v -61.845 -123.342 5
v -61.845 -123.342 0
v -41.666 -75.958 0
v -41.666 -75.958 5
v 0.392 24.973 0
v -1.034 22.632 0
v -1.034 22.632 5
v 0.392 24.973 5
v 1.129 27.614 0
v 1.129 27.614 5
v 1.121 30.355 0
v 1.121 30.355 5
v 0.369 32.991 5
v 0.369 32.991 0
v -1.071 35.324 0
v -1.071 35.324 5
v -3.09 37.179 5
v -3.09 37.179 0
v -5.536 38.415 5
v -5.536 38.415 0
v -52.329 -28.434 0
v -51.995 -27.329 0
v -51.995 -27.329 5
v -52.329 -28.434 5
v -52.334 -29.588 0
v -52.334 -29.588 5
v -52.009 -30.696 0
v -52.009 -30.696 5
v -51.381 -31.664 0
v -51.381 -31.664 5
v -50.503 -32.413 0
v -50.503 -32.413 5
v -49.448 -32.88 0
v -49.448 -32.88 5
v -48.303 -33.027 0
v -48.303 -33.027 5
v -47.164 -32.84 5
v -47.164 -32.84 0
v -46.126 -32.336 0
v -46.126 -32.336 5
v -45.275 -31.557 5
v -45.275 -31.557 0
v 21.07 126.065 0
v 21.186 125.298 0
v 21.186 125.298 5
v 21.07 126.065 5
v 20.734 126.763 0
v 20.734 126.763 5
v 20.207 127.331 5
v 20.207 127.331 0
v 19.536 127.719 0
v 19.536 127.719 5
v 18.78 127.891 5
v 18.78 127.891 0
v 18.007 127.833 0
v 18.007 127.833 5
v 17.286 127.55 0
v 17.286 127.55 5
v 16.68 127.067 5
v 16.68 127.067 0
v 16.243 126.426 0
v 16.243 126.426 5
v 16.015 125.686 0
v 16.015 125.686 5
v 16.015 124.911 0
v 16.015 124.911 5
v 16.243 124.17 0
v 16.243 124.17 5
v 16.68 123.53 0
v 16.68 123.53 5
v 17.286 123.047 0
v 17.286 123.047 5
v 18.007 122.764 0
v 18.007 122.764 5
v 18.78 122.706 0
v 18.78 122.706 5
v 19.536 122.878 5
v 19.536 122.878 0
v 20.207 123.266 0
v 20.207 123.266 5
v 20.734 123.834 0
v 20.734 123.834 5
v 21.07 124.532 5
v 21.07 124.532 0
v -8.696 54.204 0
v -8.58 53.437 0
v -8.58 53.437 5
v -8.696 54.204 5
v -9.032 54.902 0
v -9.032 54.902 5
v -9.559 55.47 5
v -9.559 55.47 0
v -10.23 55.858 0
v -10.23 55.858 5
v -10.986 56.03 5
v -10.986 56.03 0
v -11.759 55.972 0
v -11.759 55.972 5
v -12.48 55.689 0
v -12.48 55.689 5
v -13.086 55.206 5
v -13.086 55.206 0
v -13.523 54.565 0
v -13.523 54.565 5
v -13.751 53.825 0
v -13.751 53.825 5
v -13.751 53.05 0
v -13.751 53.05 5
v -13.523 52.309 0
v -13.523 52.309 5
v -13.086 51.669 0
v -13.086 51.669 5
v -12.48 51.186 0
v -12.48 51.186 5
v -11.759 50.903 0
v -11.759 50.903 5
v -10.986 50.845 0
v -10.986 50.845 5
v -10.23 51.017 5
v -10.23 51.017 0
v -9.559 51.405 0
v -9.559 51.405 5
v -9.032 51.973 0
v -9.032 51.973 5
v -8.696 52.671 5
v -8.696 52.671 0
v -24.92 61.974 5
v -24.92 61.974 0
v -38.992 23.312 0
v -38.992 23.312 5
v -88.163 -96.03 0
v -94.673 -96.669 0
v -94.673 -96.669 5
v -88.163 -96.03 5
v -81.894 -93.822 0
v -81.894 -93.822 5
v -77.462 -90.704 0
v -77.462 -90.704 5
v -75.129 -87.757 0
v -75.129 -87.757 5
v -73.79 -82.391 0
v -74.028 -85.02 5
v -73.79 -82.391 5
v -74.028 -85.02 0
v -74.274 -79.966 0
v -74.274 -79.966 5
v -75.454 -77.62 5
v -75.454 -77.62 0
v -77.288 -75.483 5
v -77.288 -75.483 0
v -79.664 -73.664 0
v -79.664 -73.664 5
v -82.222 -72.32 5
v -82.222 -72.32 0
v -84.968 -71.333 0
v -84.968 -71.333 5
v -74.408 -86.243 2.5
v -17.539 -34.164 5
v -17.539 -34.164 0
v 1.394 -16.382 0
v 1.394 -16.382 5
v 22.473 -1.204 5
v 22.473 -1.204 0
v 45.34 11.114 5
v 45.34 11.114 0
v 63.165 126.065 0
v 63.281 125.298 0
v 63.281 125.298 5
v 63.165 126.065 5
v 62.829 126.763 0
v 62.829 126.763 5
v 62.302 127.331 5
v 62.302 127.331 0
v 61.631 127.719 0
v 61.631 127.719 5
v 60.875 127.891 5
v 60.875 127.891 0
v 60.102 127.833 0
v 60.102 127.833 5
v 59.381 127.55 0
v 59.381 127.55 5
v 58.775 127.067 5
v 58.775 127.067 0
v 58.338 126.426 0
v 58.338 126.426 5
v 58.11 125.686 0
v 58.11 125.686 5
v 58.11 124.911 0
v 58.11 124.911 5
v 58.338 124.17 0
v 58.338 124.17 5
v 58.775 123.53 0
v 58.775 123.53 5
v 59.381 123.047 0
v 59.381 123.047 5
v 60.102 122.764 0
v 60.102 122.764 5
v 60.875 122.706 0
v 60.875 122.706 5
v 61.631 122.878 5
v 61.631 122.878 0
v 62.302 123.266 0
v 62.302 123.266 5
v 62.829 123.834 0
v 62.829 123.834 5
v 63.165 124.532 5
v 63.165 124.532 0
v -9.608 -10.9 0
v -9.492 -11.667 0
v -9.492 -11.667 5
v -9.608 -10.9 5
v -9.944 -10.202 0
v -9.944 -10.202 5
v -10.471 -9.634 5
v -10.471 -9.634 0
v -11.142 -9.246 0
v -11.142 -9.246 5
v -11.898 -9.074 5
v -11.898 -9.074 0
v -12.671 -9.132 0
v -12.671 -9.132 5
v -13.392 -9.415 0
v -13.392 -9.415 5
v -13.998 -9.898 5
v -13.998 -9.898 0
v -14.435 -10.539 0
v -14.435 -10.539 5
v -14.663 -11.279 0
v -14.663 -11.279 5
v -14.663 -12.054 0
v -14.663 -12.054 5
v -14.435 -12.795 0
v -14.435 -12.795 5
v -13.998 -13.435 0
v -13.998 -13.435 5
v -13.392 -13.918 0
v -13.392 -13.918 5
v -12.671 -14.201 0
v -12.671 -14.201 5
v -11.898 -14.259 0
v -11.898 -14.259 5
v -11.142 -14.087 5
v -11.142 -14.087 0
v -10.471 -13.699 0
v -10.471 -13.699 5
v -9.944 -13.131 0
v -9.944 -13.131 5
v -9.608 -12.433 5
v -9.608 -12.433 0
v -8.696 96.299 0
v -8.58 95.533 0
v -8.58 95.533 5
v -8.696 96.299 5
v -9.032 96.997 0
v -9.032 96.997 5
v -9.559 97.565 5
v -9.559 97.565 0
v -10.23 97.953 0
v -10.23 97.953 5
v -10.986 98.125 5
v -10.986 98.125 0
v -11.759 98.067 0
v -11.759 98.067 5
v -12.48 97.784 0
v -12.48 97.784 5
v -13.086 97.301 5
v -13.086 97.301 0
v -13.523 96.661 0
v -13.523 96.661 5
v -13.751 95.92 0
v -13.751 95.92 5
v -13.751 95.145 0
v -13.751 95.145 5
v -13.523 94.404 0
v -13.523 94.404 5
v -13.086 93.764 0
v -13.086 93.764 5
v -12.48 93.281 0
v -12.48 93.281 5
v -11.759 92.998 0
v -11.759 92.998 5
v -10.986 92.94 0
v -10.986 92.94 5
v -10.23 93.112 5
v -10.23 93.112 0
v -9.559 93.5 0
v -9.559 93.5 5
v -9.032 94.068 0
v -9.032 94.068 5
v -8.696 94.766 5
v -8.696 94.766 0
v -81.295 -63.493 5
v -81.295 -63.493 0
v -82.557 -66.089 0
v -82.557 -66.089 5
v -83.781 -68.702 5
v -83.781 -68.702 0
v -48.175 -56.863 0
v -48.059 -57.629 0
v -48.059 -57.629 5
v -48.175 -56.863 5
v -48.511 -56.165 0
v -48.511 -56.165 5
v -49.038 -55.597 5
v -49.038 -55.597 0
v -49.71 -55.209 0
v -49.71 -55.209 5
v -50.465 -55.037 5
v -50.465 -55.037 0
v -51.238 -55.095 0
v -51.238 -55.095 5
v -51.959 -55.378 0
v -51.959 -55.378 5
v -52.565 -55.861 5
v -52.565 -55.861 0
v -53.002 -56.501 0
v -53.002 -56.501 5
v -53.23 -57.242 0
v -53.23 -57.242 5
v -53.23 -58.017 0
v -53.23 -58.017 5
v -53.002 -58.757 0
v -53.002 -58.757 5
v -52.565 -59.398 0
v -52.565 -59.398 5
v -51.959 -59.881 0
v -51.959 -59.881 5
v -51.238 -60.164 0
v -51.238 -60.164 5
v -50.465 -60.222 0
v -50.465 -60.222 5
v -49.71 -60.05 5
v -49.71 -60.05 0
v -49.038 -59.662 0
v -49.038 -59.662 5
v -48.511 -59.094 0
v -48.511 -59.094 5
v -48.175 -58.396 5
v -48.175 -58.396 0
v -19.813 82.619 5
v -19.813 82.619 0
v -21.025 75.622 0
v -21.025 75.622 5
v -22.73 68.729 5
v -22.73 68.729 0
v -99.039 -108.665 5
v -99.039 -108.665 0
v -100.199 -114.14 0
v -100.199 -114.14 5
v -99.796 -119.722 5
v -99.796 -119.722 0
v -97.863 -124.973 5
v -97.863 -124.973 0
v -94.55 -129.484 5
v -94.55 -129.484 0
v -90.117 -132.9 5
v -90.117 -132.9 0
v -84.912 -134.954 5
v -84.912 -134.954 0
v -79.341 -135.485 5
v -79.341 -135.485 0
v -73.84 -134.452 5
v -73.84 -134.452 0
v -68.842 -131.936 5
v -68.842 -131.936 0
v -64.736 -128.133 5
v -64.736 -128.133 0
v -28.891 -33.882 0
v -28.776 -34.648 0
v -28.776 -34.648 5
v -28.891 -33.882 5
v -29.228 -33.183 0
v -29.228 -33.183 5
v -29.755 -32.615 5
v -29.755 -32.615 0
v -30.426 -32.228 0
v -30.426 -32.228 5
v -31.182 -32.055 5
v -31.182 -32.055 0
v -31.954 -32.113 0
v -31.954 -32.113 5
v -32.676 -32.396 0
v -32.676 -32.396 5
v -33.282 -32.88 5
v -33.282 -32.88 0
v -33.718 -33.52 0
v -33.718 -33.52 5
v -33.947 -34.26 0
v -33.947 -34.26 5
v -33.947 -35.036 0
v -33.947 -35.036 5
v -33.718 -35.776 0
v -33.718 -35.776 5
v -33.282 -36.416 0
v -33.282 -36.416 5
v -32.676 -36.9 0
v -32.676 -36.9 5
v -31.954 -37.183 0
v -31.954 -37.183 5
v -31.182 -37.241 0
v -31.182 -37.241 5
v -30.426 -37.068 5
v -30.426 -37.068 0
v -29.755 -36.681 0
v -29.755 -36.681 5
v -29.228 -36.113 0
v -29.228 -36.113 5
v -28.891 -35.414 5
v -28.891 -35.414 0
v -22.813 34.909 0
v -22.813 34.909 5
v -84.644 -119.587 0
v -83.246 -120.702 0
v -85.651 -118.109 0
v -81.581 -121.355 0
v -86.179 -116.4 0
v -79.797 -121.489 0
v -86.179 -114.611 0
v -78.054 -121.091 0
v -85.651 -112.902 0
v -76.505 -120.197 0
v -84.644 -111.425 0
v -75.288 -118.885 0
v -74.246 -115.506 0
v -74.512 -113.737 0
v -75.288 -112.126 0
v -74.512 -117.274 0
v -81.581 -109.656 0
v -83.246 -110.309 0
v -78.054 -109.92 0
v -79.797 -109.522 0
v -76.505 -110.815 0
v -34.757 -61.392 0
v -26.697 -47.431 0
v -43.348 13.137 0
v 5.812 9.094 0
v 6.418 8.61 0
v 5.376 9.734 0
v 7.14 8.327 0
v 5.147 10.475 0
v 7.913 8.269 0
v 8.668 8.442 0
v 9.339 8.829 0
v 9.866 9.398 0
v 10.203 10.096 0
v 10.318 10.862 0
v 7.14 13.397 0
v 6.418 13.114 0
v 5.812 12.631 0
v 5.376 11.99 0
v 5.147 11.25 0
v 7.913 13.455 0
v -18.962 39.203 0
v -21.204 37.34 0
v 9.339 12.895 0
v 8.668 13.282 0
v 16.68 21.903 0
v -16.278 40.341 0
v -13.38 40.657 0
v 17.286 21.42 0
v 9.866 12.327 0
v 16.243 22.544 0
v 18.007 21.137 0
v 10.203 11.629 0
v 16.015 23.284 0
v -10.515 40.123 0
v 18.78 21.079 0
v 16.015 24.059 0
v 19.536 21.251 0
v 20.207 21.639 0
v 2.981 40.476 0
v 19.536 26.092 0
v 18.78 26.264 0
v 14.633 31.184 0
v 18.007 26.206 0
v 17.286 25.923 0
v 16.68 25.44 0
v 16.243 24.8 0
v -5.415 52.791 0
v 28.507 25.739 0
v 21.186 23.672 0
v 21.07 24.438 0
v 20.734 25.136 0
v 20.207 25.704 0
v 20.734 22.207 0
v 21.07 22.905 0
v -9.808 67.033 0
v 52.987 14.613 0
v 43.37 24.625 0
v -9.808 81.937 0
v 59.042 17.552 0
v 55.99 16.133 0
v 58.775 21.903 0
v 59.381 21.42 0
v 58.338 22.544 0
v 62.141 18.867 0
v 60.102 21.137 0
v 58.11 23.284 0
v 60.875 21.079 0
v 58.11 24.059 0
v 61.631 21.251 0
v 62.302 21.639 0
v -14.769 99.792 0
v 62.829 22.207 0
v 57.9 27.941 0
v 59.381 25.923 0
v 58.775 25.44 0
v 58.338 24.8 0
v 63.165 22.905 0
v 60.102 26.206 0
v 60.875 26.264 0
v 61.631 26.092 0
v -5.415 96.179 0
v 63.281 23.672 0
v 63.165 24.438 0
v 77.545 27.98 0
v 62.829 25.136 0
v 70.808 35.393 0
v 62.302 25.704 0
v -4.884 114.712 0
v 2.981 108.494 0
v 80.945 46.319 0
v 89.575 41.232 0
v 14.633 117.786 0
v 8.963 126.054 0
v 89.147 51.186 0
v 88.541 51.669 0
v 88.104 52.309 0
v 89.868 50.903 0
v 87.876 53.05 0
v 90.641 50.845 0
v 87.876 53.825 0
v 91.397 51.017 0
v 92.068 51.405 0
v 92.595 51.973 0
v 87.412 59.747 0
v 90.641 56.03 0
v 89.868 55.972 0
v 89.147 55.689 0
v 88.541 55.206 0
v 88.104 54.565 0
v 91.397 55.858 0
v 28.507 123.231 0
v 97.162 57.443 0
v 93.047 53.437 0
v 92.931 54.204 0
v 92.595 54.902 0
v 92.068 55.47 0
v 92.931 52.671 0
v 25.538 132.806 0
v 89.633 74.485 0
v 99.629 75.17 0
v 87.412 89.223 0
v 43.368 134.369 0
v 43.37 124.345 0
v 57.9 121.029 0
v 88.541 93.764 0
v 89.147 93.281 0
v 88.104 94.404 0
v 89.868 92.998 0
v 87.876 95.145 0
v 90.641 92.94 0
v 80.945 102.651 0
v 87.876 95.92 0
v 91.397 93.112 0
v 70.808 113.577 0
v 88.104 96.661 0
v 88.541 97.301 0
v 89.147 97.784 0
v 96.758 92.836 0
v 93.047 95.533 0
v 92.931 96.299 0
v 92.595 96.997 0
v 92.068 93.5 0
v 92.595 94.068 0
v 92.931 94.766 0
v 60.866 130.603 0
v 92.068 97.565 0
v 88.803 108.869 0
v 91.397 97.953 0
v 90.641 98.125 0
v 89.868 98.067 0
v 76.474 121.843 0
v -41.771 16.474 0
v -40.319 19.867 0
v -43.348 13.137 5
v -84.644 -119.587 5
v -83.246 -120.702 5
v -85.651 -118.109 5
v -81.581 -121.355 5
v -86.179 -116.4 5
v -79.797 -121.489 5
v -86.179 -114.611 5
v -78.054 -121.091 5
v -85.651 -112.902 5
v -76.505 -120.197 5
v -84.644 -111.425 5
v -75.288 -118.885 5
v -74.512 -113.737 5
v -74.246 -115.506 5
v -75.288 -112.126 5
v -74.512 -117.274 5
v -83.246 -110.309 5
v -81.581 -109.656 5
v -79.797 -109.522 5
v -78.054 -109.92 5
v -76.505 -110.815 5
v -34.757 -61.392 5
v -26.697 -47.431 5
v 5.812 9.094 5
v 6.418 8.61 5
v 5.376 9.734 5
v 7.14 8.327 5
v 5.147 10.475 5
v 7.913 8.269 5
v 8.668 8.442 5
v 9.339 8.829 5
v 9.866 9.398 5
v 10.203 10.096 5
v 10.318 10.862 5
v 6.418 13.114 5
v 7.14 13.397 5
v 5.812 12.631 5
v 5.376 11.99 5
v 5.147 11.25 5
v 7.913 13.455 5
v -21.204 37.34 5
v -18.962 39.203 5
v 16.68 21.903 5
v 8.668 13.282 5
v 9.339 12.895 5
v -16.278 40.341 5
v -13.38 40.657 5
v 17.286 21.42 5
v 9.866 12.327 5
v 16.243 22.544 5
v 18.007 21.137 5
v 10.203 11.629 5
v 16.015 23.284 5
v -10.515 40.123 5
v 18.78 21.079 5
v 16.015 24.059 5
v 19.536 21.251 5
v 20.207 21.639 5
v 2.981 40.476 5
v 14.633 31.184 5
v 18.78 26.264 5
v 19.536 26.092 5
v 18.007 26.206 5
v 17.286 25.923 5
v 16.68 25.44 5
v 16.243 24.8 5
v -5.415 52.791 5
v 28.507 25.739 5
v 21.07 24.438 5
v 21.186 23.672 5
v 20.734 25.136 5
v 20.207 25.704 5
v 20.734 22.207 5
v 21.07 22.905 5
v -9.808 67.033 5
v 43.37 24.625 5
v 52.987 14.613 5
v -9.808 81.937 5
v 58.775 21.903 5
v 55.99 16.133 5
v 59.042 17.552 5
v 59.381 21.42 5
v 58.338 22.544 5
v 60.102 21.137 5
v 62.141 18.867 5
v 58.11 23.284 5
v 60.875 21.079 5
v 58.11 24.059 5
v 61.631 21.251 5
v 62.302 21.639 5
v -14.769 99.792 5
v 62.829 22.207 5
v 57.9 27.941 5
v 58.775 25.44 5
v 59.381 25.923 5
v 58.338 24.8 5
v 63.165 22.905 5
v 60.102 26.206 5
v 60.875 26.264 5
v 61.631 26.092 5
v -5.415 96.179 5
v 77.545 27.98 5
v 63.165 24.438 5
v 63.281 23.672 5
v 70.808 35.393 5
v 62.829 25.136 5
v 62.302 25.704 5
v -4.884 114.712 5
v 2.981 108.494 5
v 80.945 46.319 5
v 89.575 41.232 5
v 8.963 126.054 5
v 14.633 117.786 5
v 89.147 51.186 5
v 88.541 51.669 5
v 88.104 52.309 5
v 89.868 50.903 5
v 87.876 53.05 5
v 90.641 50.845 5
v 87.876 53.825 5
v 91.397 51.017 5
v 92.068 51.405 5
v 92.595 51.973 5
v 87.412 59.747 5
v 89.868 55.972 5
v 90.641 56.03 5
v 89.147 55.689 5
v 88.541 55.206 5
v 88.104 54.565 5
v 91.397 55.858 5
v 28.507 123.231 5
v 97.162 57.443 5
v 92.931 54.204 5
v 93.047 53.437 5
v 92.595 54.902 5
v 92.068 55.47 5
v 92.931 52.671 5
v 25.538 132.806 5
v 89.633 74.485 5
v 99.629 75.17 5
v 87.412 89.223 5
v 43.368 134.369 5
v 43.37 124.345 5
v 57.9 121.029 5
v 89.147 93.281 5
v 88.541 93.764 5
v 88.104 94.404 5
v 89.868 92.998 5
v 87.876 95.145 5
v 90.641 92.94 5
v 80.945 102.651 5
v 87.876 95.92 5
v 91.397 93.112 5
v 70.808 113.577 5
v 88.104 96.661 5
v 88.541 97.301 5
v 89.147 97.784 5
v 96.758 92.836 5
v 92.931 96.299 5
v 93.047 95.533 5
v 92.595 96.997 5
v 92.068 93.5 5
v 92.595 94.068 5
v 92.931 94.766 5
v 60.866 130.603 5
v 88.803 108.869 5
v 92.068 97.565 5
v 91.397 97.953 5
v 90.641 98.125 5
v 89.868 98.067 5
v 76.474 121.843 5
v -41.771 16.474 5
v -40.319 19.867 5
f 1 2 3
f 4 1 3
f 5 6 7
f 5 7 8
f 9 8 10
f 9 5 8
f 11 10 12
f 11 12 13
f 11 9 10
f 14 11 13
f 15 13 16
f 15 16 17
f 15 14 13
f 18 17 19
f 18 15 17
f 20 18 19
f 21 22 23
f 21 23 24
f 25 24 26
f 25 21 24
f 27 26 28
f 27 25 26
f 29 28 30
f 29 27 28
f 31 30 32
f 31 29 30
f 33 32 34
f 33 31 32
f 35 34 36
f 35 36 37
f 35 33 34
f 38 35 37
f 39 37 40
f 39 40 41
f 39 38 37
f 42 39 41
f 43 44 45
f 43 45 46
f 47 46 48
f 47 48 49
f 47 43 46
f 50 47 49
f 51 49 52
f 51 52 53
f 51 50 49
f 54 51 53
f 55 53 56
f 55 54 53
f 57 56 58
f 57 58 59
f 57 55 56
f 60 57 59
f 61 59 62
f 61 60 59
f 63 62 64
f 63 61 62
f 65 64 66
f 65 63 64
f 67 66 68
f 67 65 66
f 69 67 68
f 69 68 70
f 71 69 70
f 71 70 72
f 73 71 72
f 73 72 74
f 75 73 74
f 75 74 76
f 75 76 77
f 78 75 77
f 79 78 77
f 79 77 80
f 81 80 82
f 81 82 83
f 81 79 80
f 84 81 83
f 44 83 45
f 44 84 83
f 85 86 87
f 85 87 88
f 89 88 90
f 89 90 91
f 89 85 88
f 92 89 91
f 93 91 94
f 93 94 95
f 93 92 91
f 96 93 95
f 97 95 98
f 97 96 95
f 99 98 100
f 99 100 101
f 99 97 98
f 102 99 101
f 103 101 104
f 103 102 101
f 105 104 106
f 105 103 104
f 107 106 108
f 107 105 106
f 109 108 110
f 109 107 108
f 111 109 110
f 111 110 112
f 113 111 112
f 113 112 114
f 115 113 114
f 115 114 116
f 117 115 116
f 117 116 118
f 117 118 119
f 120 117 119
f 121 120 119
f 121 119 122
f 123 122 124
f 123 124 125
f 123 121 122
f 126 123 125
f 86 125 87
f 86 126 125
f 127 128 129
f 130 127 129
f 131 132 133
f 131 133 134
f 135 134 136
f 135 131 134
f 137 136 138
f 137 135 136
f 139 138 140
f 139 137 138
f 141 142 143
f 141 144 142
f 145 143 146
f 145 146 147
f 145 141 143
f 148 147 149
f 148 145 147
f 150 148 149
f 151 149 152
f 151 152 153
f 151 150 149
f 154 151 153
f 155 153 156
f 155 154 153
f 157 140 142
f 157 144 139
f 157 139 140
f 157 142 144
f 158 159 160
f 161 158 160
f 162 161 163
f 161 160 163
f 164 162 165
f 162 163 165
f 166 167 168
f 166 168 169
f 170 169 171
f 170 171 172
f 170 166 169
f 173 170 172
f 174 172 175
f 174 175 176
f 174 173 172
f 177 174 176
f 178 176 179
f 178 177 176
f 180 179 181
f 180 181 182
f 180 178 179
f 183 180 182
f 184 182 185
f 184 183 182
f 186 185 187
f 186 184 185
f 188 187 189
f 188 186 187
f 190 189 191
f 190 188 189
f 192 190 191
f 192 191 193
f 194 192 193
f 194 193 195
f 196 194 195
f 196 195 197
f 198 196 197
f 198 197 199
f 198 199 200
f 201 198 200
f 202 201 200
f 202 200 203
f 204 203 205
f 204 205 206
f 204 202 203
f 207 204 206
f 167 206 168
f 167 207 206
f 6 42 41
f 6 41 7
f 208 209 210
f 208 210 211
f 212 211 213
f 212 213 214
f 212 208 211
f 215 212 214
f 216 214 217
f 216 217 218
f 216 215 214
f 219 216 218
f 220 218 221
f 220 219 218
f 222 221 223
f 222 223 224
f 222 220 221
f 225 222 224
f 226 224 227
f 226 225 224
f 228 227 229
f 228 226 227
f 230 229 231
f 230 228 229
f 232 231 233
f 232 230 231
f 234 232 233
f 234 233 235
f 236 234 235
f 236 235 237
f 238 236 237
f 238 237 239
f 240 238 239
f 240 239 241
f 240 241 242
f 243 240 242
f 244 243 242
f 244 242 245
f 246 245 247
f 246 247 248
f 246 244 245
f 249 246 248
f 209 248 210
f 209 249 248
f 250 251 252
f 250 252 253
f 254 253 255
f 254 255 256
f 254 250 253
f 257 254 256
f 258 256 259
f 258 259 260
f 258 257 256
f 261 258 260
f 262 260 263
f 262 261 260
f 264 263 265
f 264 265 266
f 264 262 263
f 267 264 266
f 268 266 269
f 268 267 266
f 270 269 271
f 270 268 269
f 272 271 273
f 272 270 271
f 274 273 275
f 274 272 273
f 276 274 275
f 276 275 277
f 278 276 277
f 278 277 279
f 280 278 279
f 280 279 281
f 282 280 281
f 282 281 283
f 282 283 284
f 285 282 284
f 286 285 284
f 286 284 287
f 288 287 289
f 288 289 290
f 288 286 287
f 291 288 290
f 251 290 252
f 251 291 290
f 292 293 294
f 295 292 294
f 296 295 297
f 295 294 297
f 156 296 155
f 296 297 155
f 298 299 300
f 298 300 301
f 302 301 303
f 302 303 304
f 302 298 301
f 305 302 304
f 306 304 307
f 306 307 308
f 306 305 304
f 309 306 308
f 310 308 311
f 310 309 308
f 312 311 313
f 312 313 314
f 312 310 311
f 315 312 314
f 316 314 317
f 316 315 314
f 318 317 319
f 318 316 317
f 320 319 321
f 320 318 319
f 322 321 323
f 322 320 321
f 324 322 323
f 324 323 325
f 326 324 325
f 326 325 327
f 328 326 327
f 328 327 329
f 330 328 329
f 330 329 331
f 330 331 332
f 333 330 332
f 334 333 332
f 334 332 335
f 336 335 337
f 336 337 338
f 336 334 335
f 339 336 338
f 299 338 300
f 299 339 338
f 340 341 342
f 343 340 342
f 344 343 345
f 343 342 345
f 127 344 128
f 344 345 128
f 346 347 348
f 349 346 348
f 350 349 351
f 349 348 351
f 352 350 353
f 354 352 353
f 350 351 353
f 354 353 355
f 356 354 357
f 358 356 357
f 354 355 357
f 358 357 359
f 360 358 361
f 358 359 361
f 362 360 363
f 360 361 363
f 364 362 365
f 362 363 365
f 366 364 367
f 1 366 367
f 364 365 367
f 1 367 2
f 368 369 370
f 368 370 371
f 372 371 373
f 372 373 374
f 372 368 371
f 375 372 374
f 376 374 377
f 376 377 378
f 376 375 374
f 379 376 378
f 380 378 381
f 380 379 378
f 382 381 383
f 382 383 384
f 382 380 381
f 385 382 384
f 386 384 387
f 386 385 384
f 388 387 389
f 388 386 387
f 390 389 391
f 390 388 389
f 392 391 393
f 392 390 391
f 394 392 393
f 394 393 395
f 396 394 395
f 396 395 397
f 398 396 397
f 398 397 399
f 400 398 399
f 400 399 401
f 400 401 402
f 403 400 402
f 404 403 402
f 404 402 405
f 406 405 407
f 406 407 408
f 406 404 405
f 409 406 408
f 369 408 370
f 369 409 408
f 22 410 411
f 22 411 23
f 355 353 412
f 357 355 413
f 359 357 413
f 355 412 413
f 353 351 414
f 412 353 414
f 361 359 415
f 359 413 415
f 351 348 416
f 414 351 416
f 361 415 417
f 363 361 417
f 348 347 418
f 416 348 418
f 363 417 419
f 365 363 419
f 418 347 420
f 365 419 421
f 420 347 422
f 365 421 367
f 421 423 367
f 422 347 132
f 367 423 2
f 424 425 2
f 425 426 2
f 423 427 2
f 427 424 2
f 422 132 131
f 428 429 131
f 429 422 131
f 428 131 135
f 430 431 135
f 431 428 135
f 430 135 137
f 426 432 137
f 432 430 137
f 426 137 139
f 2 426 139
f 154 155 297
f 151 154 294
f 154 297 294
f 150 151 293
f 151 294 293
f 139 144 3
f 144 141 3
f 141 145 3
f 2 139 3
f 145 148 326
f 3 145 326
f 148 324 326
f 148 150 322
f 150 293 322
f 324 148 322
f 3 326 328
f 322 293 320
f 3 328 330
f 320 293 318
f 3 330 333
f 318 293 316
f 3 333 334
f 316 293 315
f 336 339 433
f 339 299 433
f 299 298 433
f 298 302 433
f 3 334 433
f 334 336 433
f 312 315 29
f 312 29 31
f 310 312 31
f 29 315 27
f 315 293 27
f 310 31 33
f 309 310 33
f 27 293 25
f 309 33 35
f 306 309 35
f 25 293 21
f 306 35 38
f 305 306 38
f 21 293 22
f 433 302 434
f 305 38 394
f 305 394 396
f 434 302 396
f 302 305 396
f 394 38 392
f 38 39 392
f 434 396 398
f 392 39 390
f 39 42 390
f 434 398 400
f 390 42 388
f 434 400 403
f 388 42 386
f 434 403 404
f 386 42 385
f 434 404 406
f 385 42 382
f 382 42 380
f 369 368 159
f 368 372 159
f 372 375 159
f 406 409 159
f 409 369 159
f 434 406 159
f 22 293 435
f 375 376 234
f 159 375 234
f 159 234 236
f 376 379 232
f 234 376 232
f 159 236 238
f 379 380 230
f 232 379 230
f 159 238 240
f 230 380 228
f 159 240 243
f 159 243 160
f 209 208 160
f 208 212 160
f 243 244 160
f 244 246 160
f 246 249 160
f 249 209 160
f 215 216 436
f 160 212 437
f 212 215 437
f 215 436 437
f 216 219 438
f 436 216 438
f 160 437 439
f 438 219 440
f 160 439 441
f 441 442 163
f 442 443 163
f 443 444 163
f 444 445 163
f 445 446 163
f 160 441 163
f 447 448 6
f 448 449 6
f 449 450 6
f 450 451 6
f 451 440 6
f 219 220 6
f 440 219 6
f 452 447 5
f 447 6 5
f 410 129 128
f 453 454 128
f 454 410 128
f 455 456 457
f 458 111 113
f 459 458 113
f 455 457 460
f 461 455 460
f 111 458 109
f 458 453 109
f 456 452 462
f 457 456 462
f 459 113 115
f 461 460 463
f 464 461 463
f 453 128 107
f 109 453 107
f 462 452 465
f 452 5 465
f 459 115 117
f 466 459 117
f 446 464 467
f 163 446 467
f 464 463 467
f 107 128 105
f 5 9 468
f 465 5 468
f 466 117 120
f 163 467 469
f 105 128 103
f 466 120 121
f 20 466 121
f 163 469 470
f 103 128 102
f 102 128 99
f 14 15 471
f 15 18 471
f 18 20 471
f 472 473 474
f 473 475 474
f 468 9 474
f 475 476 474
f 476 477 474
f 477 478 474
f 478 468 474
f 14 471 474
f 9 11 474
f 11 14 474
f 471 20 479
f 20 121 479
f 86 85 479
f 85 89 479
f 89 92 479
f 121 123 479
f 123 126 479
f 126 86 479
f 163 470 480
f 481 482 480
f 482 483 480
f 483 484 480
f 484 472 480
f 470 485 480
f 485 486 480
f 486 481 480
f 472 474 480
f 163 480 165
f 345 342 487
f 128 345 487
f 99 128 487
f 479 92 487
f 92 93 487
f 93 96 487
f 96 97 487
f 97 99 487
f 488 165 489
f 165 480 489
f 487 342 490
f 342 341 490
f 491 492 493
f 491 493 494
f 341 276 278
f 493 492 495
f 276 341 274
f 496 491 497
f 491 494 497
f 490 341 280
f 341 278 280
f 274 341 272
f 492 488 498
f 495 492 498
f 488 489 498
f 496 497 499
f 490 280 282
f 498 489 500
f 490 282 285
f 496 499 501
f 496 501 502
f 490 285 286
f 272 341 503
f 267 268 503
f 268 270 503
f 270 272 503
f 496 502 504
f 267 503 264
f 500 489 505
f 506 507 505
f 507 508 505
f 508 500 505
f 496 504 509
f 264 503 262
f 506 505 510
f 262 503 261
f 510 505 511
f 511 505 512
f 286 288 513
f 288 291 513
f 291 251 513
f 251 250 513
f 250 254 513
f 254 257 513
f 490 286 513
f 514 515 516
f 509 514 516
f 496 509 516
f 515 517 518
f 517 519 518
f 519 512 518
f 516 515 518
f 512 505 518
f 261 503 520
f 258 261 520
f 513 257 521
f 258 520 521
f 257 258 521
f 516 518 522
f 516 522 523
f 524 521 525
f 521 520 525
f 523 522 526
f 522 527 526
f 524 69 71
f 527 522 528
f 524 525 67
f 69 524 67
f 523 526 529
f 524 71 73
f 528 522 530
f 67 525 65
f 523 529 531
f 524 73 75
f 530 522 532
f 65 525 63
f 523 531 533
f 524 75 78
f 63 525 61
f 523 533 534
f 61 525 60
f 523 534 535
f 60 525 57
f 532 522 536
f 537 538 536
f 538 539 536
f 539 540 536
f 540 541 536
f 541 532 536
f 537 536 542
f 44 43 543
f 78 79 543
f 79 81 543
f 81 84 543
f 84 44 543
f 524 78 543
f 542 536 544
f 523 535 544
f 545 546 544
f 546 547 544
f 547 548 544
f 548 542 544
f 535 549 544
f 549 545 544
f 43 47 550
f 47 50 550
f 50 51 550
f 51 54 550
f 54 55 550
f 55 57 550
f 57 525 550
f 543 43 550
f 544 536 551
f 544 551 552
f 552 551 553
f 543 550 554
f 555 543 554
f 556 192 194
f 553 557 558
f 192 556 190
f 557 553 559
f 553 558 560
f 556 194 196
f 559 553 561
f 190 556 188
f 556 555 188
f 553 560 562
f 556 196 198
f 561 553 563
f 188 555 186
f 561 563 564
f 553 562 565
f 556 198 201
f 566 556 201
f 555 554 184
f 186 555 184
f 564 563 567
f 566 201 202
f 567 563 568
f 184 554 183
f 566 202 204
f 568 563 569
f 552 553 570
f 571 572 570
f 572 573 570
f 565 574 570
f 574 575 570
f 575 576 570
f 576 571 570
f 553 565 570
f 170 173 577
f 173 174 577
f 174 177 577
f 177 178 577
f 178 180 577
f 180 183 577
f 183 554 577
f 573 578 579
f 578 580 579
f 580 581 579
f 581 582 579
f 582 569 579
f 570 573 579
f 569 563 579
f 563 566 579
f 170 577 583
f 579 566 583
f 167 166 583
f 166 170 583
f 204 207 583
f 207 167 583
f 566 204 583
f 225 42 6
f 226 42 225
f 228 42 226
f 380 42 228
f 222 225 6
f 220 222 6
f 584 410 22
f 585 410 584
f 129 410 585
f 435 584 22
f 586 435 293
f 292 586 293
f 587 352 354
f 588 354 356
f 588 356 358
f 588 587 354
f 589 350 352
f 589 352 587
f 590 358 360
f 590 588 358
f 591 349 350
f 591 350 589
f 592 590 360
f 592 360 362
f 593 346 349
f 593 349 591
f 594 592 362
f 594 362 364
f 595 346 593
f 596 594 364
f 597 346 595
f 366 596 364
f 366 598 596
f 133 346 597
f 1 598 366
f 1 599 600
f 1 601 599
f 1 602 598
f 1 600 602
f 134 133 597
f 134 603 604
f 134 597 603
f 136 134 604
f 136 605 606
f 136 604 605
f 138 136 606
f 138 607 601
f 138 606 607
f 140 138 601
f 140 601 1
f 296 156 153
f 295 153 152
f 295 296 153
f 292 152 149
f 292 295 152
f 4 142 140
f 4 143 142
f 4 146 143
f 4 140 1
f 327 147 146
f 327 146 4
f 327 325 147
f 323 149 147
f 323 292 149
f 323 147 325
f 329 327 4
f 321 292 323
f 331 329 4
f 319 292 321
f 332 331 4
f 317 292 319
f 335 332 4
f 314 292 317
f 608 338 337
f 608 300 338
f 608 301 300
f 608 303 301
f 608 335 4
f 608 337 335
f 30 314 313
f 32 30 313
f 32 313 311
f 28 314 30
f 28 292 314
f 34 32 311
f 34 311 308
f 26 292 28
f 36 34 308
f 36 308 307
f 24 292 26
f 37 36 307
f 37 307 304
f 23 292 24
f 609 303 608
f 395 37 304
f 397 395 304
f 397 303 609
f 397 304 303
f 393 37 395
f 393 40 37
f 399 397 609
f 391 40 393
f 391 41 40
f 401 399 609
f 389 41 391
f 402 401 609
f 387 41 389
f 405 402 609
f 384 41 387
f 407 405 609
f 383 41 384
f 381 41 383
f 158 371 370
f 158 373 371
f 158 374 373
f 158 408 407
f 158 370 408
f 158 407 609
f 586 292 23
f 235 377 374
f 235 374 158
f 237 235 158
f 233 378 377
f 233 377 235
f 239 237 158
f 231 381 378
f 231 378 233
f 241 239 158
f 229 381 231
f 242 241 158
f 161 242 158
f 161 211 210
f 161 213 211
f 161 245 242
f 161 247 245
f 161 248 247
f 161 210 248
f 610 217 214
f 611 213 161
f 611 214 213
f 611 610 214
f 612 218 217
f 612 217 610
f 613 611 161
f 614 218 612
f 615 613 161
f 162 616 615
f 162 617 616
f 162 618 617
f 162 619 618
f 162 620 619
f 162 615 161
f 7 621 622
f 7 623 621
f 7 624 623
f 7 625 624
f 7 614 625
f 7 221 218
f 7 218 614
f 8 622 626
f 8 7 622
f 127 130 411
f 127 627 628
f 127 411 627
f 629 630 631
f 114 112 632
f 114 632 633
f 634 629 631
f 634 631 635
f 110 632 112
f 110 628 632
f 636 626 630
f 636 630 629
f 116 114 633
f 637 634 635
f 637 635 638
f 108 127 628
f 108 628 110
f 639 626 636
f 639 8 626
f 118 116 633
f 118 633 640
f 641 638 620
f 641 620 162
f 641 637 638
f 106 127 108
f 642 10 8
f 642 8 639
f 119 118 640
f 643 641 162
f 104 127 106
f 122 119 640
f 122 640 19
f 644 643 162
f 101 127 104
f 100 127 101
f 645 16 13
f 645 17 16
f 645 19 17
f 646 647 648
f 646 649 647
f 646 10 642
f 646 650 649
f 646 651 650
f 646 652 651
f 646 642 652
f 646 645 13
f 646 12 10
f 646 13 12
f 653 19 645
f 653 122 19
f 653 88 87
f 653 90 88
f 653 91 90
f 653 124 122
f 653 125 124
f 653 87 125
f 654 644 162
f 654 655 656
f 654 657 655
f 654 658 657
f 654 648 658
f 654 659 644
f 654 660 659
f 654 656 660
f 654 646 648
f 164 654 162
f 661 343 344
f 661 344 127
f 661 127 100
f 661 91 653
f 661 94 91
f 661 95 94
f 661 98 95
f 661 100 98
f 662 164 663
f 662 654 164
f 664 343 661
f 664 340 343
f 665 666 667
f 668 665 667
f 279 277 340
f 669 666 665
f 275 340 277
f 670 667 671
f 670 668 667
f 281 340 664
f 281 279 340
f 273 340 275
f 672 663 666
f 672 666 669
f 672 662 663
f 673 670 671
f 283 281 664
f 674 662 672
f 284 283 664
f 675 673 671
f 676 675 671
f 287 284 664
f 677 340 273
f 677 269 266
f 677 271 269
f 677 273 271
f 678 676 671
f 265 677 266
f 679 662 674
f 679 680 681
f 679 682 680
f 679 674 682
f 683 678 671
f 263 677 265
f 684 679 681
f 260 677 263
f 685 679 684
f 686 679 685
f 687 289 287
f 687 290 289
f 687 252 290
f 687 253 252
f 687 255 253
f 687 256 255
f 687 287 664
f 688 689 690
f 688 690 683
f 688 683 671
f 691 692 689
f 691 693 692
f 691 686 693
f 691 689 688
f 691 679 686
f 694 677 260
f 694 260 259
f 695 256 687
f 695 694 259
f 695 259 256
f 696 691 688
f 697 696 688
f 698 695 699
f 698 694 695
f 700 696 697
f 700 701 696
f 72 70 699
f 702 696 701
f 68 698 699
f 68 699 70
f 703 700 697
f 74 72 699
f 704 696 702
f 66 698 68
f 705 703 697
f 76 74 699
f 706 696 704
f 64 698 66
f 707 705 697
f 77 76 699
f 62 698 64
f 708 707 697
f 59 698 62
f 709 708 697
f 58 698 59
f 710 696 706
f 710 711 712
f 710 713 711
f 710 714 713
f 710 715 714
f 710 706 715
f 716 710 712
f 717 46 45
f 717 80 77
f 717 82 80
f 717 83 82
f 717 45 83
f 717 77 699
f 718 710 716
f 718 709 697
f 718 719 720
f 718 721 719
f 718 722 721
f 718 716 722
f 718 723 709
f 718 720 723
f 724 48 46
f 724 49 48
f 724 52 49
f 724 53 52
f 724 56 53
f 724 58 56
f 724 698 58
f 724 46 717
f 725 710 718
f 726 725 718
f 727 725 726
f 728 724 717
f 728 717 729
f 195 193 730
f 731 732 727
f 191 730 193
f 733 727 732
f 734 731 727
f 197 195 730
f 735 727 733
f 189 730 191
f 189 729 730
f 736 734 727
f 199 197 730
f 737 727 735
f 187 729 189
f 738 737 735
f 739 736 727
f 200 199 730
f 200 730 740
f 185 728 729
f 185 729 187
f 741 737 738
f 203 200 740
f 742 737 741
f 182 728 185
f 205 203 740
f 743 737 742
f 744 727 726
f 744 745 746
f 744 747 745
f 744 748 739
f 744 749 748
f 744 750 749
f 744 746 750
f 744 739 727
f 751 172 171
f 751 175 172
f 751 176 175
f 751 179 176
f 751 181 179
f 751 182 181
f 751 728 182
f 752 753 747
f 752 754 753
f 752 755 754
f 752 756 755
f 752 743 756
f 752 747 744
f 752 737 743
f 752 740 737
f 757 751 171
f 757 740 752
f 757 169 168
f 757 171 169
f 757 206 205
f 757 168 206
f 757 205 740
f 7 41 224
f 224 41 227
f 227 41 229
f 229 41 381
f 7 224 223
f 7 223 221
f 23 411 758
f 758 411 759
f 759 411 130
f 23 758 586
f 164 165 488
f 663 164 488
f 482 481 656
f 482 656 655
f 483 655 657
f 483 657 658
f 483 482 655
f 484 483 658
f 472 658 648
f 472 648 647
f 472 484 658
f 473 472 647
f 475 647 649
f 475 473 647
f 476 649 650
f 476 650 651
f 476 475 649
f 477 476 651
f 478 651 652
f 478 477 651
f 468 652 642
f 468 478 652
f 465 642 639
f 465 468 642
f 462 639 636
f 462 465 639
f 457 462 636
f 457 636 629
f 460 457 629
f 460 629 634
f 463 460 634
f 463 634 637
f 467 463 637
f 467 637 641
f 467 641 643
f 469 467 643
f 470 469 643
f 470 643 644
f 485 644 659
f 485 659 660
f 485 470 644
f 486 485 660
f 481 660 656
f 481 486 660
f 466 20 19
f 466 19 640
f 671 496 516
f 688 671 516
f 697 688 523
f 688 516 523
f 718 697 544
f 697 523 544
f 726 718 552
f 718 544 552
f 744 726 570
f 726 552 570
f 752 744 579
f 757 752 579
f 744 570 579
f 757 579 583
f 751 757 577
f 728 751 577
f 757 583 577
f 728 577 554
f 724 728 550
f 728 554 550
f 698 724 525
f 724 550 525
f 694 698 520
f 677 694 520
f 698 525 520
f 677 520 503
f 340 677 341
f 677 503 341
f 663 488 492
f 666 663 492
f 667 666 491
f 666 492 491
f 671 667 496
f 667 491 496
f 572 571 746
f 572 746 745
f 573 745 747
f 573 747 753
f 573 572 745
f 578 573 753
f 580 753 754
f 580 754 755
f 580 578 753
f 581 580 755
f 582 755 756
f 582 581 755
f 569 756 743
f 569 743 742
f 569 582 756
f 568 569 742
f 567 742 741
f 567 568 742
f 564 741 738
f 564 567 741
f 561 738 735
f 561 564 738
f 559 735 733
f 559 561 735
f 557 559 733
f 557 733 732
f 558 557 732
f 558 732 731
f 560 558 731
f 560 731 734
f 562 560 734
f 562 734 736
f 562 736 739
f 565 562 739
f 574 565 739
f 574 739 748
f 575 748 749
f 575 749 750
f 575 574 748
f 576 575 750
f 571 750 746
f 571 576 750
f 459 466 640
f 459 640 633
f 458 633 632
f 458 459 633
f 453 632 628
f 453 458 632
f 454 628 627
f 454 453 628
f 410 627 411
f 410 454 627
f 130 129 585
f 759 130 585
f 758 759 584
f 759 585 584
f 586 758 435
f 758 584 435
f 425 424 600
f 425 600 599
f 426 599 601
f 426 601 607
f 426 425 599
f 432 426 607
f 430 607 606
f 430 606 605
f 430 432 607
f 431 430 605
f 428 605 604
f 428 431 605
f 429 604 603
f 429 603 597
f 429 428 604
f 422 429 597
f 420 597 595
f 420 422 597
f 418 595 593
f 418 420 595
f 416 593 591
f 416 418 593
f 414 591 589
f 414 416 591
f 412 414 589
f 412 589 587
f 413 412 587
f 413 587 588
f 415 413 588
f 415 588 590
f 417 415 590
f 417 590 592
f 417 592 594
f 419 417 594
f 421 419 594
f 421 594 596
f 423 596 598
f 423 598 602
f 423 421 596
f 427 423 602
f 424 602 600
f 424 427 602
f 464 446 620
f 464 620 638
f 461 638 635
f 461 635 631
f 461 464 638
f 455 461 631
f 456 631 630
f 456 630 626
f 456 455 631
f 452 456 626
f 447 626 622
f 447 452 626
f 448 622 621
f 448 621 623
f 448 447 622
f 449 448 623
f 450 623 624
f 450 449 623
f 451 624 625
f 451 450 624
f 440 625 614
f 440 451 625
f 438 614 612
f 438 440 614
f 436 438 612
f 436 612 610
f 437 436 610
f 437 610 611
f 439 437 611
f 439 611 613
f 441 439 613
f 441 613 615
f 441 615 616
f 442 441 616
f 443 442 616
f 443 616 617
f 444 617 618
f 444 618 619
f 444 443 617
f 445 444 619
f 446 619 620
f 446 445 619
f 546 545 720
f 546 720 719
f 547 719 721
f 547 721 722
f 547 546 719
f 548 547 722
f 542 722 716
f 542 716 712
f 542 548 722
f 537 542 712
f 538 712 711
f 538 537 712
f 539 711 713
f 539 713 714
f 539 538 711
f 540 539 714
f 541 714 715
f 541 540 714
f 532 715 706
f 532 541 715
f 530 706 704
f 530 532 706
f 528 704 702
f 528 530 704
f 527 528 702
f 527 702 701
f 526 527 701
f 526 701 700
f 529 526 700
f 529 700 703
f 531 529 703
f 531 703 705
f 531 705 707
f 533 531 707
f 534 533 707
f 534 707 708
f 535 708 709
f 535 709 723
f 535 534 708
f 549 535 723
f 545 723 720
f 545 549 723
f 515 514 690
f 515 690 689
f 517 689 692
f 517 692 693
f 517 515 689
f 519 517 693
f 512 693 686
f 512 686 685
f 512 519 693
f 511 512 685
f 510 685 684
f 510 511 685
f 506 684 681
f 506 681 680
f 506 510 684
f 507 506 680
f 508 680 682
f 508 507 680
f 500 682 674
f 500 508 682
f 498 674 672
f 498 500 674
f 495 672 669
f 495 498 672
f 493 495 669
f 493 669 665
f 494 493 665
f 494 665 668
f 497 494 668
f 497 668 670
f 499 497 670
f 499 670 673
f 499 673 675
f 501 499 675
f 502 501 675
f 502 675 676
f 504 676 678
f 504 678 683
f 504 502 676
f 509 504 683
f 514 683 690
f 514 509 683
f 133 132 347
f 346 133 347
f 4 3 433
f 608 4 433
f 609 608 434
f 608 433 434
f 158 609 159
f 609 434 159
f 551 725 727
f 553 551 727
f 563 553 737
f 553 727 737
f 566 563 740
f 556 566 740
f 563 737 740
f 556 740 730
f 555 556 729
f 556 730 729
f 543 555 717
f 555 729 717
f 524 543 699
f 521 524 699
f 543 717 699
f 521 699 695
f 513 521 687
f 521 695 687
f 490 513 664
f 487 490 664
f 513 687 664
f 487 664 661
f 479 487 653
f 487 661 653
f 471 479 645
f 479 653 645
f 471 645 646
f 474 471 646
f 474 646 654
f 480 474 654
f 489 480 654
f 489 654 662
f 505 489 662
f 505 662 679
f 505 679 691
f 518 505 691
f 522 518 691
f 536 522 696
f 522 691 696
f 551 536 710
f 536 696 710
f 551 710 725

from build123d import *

# Parameters (mm, degrees)
SKETCH_1_R          = 1.85
SKETCH_1_R_2        = 6
SKETCH_1_R_3        = 2.6
SKETCH_1_R_4        = 40
EXTRUDE_1_DEPTH     = 5
SKETCH_2_R          = 50
CUT_EXTRUDE_1_DEPTH = 5


with BuildPart() as part:
    # 草图1 → 凸台-拉伸1 (new body)
    with BuildSketch(Plane.XY):
        with BuildLine():
            Line((45.340426295, 11.113882118), (52.986920218, 14.612571091))
            ThreePointArc((52.986920218, 14.612571091), (57.510180634, 16.855144901), (62.140860345, 18.86656915))
            ThreePointArc((62.140860345, 18.86656915), (76.473592144, 121.843079098), (-19.812815771, 82.619152052))
            ThreePointArc((-19.812815771, 82.619152052), (-21.816180826, 72.160455141), (-24.920337213, 61.974090443))
            Line((-24.920337213, 61.974090443), (-38.992341568, 23.311576231))
            ThreePointArc((-38.992341568, 23.311576231), (-41.02904615, 18.163814554), (-43.347502102, 13.136650558))
            Line((-43.347502102, 13.136650558), (-81.294613945, -63.493156131))
            ThreePointArc((-81.294613945, -63.493156131), (-83.173683364, -67.393304084), (-84.967894718, -71.333210372))
            add(Edge.make_bspline(
                [(-94.673253721, -96.669107716), (-78.493027504, -96.908185151), (-74.407692057, -86.243392693), (-70.32235661, -75.578600234), (-84.967894718, -71.333210372)],
                knots=[1.469085418, 1.469085418, 1.469085418, 2.850930512, 2.850930512, 4.232775606, 4.232775606, 4.232775606], degree=2, weights=[1, 0.770658452, 1, 0.770658452, 1]))
            Line((-94.673253721, -96.669107716), (-99.039465007, -108.665174635))
            ThreePointArc((-99.039465007, -108.665174635), (-87.586525496, -134.109636137), (-61.84467438, -123.341741928))
            Line((-61.84467438, -123.341741928), (-41.665865642, -75.957716718))
            ThreePointArc((-41.665865642, -75.957716718), (-30.867859398, -54.330265242), (-17.539479197, -34.163513461))
            ThreePointArc((-17.539479197, -34.163513461), (11.686808966, -8.450543885), (45.340426295, 11.113882118))
        make_face()
        with Locations((84.133254342, 74.484980418)):
            Circle(SKETCH_1_R, mode=Mode.SUBTRACT)
        with Locations((-4.866745658, 74.484980418)):
            Circle(SKETCH_1_R, mode=Mode.SUBTRACT)
        with Locations((71.099506104, 43.018728655)):
            Circle(SKETCH_1_R, mode=Mode.SUBTRACT)
        with Locations((-80.245612592, -115.505577501)):
            Circle(SKETCH_1_R_2, mode=Mode.SUBTRACT)
        with Locations((71.099506104, 105.95123218)):
            Circle(SKETCH_1_R, mode=Mode.SUBTRACT)
        with Locations((39.633254342, 29.984980418)):
            Circle(SKETCH_1_R, mode=Mode.SUBTRACT)
        with Locations((8.167002579, 43.018728655)):
            Circle(SKETCH_1_R, mode=Mode.SUBTRACT)
        with Locations((8.167002579, 105.95123218)):
            Circle(SKETCH_1_R, mode=Mode.SUBTRACT)
        with Locations((39.633254342, 118.984980418)):
            Circle(SKETCH_1_R, mode=Mode.SUBTRACT)
        with Locations((90.44662863, 95.532569198)):
            Circle(SKETCH_1_R_3, mode=Mode.SUBTRACT)
        with Locations((60.680843122, 125.298354706)):
            Circle(SKETCH_1_R_3, mode=Mode.SUBTRACT)
        with Locations((18.585665562, 125.298354706)):
            Circle(SKETCH_1_R_3, mode=Mode.SUBTRACT)
        with Locations((-11.180119947, 95.532569198)):
            Circle(SKETCH_1_R_3, mode=Mode.SUBTRACT)
        with Locations((-11.180119947, 53.437391637)):
            Circle(SKETCH_1_R_3, mode=Mode.SUBTRACT)
        with Locations((18.585665562, 23.671606129)):
            Circle(SKETCH_1_R_3, mode=Mode.SUBTRACT)
        with Locations((60.680843122, 23.671606129)):
            Circle(SKETCH_1_R_3, mode=Mode.SUBTRACT)
        with Locations((90.44662863, 53.437391637)):
            Circle(SKETCH_1_R_3, mode=Mode.SUBTRACT)
        with Locations((-31.375823455, -34.648004813)):
            Circle(SKETCH_1_R_3, mode=Mode.SUBTRACT)
        with Locations((7.718202275, 10.862157861)):
            Circle(SKETCH_1_R_3, mode=Mode.SUBTRACT)
        with Locations((-12.092195165, -11.66667152)):
            Circle(SKETCH_1_R_3, mode=Mode.SUBTRACT)
        with Locations((-50.659451746, -57.629338107)):
            Circle(SKETCH_1_R_3, mode=Mode.SUBTRACT)
        with Locations((39.633254342, 74.484980418)):
            Circle(SKETCH_1_R_4, mode=Mode.SUBTRACT)
        with BuildLine():
            Line((-5.536305869, 38.415363853), (-10.514583927, 40.122913857))
            ThreePointArc((-10.514583927, 40.122913857), (-17.662135878, 39.870705025), (-22.813209689, 34.909097746))
            Line((-22.813209689, 34.909097746), (-51.994954934, -27.329380157))
            ThreePointArc((-51.994954934, -27.329380157), (-50.503277554, -32.413196821), (-45.27475721, -31.55711955))
            Line((-45.27475721, -31.55711955), (-1.034437322, 22.632199259))
            ThreePointArc((-1.034437322, 22.632199259), (0.835703515, 31.699245343), (-5.536305869, 38.415363853))
        make_face(mode=Mode.SUBTRACT)
    extrude(amount=EXTRUDE_1_DEPTH)

    # 草图2 → 切除-拉伸1 (cut)
    with BuildSketch(Plane.XY.offset(5)):
        with Locations((39.633254342, 74.484980418)):
            Circle(SKETCH_2_R)
    extrude(amount=-CUT_EXTRUDE_1_DEPTH, mode=Mode.SUBTRACT)


solid = part.part
